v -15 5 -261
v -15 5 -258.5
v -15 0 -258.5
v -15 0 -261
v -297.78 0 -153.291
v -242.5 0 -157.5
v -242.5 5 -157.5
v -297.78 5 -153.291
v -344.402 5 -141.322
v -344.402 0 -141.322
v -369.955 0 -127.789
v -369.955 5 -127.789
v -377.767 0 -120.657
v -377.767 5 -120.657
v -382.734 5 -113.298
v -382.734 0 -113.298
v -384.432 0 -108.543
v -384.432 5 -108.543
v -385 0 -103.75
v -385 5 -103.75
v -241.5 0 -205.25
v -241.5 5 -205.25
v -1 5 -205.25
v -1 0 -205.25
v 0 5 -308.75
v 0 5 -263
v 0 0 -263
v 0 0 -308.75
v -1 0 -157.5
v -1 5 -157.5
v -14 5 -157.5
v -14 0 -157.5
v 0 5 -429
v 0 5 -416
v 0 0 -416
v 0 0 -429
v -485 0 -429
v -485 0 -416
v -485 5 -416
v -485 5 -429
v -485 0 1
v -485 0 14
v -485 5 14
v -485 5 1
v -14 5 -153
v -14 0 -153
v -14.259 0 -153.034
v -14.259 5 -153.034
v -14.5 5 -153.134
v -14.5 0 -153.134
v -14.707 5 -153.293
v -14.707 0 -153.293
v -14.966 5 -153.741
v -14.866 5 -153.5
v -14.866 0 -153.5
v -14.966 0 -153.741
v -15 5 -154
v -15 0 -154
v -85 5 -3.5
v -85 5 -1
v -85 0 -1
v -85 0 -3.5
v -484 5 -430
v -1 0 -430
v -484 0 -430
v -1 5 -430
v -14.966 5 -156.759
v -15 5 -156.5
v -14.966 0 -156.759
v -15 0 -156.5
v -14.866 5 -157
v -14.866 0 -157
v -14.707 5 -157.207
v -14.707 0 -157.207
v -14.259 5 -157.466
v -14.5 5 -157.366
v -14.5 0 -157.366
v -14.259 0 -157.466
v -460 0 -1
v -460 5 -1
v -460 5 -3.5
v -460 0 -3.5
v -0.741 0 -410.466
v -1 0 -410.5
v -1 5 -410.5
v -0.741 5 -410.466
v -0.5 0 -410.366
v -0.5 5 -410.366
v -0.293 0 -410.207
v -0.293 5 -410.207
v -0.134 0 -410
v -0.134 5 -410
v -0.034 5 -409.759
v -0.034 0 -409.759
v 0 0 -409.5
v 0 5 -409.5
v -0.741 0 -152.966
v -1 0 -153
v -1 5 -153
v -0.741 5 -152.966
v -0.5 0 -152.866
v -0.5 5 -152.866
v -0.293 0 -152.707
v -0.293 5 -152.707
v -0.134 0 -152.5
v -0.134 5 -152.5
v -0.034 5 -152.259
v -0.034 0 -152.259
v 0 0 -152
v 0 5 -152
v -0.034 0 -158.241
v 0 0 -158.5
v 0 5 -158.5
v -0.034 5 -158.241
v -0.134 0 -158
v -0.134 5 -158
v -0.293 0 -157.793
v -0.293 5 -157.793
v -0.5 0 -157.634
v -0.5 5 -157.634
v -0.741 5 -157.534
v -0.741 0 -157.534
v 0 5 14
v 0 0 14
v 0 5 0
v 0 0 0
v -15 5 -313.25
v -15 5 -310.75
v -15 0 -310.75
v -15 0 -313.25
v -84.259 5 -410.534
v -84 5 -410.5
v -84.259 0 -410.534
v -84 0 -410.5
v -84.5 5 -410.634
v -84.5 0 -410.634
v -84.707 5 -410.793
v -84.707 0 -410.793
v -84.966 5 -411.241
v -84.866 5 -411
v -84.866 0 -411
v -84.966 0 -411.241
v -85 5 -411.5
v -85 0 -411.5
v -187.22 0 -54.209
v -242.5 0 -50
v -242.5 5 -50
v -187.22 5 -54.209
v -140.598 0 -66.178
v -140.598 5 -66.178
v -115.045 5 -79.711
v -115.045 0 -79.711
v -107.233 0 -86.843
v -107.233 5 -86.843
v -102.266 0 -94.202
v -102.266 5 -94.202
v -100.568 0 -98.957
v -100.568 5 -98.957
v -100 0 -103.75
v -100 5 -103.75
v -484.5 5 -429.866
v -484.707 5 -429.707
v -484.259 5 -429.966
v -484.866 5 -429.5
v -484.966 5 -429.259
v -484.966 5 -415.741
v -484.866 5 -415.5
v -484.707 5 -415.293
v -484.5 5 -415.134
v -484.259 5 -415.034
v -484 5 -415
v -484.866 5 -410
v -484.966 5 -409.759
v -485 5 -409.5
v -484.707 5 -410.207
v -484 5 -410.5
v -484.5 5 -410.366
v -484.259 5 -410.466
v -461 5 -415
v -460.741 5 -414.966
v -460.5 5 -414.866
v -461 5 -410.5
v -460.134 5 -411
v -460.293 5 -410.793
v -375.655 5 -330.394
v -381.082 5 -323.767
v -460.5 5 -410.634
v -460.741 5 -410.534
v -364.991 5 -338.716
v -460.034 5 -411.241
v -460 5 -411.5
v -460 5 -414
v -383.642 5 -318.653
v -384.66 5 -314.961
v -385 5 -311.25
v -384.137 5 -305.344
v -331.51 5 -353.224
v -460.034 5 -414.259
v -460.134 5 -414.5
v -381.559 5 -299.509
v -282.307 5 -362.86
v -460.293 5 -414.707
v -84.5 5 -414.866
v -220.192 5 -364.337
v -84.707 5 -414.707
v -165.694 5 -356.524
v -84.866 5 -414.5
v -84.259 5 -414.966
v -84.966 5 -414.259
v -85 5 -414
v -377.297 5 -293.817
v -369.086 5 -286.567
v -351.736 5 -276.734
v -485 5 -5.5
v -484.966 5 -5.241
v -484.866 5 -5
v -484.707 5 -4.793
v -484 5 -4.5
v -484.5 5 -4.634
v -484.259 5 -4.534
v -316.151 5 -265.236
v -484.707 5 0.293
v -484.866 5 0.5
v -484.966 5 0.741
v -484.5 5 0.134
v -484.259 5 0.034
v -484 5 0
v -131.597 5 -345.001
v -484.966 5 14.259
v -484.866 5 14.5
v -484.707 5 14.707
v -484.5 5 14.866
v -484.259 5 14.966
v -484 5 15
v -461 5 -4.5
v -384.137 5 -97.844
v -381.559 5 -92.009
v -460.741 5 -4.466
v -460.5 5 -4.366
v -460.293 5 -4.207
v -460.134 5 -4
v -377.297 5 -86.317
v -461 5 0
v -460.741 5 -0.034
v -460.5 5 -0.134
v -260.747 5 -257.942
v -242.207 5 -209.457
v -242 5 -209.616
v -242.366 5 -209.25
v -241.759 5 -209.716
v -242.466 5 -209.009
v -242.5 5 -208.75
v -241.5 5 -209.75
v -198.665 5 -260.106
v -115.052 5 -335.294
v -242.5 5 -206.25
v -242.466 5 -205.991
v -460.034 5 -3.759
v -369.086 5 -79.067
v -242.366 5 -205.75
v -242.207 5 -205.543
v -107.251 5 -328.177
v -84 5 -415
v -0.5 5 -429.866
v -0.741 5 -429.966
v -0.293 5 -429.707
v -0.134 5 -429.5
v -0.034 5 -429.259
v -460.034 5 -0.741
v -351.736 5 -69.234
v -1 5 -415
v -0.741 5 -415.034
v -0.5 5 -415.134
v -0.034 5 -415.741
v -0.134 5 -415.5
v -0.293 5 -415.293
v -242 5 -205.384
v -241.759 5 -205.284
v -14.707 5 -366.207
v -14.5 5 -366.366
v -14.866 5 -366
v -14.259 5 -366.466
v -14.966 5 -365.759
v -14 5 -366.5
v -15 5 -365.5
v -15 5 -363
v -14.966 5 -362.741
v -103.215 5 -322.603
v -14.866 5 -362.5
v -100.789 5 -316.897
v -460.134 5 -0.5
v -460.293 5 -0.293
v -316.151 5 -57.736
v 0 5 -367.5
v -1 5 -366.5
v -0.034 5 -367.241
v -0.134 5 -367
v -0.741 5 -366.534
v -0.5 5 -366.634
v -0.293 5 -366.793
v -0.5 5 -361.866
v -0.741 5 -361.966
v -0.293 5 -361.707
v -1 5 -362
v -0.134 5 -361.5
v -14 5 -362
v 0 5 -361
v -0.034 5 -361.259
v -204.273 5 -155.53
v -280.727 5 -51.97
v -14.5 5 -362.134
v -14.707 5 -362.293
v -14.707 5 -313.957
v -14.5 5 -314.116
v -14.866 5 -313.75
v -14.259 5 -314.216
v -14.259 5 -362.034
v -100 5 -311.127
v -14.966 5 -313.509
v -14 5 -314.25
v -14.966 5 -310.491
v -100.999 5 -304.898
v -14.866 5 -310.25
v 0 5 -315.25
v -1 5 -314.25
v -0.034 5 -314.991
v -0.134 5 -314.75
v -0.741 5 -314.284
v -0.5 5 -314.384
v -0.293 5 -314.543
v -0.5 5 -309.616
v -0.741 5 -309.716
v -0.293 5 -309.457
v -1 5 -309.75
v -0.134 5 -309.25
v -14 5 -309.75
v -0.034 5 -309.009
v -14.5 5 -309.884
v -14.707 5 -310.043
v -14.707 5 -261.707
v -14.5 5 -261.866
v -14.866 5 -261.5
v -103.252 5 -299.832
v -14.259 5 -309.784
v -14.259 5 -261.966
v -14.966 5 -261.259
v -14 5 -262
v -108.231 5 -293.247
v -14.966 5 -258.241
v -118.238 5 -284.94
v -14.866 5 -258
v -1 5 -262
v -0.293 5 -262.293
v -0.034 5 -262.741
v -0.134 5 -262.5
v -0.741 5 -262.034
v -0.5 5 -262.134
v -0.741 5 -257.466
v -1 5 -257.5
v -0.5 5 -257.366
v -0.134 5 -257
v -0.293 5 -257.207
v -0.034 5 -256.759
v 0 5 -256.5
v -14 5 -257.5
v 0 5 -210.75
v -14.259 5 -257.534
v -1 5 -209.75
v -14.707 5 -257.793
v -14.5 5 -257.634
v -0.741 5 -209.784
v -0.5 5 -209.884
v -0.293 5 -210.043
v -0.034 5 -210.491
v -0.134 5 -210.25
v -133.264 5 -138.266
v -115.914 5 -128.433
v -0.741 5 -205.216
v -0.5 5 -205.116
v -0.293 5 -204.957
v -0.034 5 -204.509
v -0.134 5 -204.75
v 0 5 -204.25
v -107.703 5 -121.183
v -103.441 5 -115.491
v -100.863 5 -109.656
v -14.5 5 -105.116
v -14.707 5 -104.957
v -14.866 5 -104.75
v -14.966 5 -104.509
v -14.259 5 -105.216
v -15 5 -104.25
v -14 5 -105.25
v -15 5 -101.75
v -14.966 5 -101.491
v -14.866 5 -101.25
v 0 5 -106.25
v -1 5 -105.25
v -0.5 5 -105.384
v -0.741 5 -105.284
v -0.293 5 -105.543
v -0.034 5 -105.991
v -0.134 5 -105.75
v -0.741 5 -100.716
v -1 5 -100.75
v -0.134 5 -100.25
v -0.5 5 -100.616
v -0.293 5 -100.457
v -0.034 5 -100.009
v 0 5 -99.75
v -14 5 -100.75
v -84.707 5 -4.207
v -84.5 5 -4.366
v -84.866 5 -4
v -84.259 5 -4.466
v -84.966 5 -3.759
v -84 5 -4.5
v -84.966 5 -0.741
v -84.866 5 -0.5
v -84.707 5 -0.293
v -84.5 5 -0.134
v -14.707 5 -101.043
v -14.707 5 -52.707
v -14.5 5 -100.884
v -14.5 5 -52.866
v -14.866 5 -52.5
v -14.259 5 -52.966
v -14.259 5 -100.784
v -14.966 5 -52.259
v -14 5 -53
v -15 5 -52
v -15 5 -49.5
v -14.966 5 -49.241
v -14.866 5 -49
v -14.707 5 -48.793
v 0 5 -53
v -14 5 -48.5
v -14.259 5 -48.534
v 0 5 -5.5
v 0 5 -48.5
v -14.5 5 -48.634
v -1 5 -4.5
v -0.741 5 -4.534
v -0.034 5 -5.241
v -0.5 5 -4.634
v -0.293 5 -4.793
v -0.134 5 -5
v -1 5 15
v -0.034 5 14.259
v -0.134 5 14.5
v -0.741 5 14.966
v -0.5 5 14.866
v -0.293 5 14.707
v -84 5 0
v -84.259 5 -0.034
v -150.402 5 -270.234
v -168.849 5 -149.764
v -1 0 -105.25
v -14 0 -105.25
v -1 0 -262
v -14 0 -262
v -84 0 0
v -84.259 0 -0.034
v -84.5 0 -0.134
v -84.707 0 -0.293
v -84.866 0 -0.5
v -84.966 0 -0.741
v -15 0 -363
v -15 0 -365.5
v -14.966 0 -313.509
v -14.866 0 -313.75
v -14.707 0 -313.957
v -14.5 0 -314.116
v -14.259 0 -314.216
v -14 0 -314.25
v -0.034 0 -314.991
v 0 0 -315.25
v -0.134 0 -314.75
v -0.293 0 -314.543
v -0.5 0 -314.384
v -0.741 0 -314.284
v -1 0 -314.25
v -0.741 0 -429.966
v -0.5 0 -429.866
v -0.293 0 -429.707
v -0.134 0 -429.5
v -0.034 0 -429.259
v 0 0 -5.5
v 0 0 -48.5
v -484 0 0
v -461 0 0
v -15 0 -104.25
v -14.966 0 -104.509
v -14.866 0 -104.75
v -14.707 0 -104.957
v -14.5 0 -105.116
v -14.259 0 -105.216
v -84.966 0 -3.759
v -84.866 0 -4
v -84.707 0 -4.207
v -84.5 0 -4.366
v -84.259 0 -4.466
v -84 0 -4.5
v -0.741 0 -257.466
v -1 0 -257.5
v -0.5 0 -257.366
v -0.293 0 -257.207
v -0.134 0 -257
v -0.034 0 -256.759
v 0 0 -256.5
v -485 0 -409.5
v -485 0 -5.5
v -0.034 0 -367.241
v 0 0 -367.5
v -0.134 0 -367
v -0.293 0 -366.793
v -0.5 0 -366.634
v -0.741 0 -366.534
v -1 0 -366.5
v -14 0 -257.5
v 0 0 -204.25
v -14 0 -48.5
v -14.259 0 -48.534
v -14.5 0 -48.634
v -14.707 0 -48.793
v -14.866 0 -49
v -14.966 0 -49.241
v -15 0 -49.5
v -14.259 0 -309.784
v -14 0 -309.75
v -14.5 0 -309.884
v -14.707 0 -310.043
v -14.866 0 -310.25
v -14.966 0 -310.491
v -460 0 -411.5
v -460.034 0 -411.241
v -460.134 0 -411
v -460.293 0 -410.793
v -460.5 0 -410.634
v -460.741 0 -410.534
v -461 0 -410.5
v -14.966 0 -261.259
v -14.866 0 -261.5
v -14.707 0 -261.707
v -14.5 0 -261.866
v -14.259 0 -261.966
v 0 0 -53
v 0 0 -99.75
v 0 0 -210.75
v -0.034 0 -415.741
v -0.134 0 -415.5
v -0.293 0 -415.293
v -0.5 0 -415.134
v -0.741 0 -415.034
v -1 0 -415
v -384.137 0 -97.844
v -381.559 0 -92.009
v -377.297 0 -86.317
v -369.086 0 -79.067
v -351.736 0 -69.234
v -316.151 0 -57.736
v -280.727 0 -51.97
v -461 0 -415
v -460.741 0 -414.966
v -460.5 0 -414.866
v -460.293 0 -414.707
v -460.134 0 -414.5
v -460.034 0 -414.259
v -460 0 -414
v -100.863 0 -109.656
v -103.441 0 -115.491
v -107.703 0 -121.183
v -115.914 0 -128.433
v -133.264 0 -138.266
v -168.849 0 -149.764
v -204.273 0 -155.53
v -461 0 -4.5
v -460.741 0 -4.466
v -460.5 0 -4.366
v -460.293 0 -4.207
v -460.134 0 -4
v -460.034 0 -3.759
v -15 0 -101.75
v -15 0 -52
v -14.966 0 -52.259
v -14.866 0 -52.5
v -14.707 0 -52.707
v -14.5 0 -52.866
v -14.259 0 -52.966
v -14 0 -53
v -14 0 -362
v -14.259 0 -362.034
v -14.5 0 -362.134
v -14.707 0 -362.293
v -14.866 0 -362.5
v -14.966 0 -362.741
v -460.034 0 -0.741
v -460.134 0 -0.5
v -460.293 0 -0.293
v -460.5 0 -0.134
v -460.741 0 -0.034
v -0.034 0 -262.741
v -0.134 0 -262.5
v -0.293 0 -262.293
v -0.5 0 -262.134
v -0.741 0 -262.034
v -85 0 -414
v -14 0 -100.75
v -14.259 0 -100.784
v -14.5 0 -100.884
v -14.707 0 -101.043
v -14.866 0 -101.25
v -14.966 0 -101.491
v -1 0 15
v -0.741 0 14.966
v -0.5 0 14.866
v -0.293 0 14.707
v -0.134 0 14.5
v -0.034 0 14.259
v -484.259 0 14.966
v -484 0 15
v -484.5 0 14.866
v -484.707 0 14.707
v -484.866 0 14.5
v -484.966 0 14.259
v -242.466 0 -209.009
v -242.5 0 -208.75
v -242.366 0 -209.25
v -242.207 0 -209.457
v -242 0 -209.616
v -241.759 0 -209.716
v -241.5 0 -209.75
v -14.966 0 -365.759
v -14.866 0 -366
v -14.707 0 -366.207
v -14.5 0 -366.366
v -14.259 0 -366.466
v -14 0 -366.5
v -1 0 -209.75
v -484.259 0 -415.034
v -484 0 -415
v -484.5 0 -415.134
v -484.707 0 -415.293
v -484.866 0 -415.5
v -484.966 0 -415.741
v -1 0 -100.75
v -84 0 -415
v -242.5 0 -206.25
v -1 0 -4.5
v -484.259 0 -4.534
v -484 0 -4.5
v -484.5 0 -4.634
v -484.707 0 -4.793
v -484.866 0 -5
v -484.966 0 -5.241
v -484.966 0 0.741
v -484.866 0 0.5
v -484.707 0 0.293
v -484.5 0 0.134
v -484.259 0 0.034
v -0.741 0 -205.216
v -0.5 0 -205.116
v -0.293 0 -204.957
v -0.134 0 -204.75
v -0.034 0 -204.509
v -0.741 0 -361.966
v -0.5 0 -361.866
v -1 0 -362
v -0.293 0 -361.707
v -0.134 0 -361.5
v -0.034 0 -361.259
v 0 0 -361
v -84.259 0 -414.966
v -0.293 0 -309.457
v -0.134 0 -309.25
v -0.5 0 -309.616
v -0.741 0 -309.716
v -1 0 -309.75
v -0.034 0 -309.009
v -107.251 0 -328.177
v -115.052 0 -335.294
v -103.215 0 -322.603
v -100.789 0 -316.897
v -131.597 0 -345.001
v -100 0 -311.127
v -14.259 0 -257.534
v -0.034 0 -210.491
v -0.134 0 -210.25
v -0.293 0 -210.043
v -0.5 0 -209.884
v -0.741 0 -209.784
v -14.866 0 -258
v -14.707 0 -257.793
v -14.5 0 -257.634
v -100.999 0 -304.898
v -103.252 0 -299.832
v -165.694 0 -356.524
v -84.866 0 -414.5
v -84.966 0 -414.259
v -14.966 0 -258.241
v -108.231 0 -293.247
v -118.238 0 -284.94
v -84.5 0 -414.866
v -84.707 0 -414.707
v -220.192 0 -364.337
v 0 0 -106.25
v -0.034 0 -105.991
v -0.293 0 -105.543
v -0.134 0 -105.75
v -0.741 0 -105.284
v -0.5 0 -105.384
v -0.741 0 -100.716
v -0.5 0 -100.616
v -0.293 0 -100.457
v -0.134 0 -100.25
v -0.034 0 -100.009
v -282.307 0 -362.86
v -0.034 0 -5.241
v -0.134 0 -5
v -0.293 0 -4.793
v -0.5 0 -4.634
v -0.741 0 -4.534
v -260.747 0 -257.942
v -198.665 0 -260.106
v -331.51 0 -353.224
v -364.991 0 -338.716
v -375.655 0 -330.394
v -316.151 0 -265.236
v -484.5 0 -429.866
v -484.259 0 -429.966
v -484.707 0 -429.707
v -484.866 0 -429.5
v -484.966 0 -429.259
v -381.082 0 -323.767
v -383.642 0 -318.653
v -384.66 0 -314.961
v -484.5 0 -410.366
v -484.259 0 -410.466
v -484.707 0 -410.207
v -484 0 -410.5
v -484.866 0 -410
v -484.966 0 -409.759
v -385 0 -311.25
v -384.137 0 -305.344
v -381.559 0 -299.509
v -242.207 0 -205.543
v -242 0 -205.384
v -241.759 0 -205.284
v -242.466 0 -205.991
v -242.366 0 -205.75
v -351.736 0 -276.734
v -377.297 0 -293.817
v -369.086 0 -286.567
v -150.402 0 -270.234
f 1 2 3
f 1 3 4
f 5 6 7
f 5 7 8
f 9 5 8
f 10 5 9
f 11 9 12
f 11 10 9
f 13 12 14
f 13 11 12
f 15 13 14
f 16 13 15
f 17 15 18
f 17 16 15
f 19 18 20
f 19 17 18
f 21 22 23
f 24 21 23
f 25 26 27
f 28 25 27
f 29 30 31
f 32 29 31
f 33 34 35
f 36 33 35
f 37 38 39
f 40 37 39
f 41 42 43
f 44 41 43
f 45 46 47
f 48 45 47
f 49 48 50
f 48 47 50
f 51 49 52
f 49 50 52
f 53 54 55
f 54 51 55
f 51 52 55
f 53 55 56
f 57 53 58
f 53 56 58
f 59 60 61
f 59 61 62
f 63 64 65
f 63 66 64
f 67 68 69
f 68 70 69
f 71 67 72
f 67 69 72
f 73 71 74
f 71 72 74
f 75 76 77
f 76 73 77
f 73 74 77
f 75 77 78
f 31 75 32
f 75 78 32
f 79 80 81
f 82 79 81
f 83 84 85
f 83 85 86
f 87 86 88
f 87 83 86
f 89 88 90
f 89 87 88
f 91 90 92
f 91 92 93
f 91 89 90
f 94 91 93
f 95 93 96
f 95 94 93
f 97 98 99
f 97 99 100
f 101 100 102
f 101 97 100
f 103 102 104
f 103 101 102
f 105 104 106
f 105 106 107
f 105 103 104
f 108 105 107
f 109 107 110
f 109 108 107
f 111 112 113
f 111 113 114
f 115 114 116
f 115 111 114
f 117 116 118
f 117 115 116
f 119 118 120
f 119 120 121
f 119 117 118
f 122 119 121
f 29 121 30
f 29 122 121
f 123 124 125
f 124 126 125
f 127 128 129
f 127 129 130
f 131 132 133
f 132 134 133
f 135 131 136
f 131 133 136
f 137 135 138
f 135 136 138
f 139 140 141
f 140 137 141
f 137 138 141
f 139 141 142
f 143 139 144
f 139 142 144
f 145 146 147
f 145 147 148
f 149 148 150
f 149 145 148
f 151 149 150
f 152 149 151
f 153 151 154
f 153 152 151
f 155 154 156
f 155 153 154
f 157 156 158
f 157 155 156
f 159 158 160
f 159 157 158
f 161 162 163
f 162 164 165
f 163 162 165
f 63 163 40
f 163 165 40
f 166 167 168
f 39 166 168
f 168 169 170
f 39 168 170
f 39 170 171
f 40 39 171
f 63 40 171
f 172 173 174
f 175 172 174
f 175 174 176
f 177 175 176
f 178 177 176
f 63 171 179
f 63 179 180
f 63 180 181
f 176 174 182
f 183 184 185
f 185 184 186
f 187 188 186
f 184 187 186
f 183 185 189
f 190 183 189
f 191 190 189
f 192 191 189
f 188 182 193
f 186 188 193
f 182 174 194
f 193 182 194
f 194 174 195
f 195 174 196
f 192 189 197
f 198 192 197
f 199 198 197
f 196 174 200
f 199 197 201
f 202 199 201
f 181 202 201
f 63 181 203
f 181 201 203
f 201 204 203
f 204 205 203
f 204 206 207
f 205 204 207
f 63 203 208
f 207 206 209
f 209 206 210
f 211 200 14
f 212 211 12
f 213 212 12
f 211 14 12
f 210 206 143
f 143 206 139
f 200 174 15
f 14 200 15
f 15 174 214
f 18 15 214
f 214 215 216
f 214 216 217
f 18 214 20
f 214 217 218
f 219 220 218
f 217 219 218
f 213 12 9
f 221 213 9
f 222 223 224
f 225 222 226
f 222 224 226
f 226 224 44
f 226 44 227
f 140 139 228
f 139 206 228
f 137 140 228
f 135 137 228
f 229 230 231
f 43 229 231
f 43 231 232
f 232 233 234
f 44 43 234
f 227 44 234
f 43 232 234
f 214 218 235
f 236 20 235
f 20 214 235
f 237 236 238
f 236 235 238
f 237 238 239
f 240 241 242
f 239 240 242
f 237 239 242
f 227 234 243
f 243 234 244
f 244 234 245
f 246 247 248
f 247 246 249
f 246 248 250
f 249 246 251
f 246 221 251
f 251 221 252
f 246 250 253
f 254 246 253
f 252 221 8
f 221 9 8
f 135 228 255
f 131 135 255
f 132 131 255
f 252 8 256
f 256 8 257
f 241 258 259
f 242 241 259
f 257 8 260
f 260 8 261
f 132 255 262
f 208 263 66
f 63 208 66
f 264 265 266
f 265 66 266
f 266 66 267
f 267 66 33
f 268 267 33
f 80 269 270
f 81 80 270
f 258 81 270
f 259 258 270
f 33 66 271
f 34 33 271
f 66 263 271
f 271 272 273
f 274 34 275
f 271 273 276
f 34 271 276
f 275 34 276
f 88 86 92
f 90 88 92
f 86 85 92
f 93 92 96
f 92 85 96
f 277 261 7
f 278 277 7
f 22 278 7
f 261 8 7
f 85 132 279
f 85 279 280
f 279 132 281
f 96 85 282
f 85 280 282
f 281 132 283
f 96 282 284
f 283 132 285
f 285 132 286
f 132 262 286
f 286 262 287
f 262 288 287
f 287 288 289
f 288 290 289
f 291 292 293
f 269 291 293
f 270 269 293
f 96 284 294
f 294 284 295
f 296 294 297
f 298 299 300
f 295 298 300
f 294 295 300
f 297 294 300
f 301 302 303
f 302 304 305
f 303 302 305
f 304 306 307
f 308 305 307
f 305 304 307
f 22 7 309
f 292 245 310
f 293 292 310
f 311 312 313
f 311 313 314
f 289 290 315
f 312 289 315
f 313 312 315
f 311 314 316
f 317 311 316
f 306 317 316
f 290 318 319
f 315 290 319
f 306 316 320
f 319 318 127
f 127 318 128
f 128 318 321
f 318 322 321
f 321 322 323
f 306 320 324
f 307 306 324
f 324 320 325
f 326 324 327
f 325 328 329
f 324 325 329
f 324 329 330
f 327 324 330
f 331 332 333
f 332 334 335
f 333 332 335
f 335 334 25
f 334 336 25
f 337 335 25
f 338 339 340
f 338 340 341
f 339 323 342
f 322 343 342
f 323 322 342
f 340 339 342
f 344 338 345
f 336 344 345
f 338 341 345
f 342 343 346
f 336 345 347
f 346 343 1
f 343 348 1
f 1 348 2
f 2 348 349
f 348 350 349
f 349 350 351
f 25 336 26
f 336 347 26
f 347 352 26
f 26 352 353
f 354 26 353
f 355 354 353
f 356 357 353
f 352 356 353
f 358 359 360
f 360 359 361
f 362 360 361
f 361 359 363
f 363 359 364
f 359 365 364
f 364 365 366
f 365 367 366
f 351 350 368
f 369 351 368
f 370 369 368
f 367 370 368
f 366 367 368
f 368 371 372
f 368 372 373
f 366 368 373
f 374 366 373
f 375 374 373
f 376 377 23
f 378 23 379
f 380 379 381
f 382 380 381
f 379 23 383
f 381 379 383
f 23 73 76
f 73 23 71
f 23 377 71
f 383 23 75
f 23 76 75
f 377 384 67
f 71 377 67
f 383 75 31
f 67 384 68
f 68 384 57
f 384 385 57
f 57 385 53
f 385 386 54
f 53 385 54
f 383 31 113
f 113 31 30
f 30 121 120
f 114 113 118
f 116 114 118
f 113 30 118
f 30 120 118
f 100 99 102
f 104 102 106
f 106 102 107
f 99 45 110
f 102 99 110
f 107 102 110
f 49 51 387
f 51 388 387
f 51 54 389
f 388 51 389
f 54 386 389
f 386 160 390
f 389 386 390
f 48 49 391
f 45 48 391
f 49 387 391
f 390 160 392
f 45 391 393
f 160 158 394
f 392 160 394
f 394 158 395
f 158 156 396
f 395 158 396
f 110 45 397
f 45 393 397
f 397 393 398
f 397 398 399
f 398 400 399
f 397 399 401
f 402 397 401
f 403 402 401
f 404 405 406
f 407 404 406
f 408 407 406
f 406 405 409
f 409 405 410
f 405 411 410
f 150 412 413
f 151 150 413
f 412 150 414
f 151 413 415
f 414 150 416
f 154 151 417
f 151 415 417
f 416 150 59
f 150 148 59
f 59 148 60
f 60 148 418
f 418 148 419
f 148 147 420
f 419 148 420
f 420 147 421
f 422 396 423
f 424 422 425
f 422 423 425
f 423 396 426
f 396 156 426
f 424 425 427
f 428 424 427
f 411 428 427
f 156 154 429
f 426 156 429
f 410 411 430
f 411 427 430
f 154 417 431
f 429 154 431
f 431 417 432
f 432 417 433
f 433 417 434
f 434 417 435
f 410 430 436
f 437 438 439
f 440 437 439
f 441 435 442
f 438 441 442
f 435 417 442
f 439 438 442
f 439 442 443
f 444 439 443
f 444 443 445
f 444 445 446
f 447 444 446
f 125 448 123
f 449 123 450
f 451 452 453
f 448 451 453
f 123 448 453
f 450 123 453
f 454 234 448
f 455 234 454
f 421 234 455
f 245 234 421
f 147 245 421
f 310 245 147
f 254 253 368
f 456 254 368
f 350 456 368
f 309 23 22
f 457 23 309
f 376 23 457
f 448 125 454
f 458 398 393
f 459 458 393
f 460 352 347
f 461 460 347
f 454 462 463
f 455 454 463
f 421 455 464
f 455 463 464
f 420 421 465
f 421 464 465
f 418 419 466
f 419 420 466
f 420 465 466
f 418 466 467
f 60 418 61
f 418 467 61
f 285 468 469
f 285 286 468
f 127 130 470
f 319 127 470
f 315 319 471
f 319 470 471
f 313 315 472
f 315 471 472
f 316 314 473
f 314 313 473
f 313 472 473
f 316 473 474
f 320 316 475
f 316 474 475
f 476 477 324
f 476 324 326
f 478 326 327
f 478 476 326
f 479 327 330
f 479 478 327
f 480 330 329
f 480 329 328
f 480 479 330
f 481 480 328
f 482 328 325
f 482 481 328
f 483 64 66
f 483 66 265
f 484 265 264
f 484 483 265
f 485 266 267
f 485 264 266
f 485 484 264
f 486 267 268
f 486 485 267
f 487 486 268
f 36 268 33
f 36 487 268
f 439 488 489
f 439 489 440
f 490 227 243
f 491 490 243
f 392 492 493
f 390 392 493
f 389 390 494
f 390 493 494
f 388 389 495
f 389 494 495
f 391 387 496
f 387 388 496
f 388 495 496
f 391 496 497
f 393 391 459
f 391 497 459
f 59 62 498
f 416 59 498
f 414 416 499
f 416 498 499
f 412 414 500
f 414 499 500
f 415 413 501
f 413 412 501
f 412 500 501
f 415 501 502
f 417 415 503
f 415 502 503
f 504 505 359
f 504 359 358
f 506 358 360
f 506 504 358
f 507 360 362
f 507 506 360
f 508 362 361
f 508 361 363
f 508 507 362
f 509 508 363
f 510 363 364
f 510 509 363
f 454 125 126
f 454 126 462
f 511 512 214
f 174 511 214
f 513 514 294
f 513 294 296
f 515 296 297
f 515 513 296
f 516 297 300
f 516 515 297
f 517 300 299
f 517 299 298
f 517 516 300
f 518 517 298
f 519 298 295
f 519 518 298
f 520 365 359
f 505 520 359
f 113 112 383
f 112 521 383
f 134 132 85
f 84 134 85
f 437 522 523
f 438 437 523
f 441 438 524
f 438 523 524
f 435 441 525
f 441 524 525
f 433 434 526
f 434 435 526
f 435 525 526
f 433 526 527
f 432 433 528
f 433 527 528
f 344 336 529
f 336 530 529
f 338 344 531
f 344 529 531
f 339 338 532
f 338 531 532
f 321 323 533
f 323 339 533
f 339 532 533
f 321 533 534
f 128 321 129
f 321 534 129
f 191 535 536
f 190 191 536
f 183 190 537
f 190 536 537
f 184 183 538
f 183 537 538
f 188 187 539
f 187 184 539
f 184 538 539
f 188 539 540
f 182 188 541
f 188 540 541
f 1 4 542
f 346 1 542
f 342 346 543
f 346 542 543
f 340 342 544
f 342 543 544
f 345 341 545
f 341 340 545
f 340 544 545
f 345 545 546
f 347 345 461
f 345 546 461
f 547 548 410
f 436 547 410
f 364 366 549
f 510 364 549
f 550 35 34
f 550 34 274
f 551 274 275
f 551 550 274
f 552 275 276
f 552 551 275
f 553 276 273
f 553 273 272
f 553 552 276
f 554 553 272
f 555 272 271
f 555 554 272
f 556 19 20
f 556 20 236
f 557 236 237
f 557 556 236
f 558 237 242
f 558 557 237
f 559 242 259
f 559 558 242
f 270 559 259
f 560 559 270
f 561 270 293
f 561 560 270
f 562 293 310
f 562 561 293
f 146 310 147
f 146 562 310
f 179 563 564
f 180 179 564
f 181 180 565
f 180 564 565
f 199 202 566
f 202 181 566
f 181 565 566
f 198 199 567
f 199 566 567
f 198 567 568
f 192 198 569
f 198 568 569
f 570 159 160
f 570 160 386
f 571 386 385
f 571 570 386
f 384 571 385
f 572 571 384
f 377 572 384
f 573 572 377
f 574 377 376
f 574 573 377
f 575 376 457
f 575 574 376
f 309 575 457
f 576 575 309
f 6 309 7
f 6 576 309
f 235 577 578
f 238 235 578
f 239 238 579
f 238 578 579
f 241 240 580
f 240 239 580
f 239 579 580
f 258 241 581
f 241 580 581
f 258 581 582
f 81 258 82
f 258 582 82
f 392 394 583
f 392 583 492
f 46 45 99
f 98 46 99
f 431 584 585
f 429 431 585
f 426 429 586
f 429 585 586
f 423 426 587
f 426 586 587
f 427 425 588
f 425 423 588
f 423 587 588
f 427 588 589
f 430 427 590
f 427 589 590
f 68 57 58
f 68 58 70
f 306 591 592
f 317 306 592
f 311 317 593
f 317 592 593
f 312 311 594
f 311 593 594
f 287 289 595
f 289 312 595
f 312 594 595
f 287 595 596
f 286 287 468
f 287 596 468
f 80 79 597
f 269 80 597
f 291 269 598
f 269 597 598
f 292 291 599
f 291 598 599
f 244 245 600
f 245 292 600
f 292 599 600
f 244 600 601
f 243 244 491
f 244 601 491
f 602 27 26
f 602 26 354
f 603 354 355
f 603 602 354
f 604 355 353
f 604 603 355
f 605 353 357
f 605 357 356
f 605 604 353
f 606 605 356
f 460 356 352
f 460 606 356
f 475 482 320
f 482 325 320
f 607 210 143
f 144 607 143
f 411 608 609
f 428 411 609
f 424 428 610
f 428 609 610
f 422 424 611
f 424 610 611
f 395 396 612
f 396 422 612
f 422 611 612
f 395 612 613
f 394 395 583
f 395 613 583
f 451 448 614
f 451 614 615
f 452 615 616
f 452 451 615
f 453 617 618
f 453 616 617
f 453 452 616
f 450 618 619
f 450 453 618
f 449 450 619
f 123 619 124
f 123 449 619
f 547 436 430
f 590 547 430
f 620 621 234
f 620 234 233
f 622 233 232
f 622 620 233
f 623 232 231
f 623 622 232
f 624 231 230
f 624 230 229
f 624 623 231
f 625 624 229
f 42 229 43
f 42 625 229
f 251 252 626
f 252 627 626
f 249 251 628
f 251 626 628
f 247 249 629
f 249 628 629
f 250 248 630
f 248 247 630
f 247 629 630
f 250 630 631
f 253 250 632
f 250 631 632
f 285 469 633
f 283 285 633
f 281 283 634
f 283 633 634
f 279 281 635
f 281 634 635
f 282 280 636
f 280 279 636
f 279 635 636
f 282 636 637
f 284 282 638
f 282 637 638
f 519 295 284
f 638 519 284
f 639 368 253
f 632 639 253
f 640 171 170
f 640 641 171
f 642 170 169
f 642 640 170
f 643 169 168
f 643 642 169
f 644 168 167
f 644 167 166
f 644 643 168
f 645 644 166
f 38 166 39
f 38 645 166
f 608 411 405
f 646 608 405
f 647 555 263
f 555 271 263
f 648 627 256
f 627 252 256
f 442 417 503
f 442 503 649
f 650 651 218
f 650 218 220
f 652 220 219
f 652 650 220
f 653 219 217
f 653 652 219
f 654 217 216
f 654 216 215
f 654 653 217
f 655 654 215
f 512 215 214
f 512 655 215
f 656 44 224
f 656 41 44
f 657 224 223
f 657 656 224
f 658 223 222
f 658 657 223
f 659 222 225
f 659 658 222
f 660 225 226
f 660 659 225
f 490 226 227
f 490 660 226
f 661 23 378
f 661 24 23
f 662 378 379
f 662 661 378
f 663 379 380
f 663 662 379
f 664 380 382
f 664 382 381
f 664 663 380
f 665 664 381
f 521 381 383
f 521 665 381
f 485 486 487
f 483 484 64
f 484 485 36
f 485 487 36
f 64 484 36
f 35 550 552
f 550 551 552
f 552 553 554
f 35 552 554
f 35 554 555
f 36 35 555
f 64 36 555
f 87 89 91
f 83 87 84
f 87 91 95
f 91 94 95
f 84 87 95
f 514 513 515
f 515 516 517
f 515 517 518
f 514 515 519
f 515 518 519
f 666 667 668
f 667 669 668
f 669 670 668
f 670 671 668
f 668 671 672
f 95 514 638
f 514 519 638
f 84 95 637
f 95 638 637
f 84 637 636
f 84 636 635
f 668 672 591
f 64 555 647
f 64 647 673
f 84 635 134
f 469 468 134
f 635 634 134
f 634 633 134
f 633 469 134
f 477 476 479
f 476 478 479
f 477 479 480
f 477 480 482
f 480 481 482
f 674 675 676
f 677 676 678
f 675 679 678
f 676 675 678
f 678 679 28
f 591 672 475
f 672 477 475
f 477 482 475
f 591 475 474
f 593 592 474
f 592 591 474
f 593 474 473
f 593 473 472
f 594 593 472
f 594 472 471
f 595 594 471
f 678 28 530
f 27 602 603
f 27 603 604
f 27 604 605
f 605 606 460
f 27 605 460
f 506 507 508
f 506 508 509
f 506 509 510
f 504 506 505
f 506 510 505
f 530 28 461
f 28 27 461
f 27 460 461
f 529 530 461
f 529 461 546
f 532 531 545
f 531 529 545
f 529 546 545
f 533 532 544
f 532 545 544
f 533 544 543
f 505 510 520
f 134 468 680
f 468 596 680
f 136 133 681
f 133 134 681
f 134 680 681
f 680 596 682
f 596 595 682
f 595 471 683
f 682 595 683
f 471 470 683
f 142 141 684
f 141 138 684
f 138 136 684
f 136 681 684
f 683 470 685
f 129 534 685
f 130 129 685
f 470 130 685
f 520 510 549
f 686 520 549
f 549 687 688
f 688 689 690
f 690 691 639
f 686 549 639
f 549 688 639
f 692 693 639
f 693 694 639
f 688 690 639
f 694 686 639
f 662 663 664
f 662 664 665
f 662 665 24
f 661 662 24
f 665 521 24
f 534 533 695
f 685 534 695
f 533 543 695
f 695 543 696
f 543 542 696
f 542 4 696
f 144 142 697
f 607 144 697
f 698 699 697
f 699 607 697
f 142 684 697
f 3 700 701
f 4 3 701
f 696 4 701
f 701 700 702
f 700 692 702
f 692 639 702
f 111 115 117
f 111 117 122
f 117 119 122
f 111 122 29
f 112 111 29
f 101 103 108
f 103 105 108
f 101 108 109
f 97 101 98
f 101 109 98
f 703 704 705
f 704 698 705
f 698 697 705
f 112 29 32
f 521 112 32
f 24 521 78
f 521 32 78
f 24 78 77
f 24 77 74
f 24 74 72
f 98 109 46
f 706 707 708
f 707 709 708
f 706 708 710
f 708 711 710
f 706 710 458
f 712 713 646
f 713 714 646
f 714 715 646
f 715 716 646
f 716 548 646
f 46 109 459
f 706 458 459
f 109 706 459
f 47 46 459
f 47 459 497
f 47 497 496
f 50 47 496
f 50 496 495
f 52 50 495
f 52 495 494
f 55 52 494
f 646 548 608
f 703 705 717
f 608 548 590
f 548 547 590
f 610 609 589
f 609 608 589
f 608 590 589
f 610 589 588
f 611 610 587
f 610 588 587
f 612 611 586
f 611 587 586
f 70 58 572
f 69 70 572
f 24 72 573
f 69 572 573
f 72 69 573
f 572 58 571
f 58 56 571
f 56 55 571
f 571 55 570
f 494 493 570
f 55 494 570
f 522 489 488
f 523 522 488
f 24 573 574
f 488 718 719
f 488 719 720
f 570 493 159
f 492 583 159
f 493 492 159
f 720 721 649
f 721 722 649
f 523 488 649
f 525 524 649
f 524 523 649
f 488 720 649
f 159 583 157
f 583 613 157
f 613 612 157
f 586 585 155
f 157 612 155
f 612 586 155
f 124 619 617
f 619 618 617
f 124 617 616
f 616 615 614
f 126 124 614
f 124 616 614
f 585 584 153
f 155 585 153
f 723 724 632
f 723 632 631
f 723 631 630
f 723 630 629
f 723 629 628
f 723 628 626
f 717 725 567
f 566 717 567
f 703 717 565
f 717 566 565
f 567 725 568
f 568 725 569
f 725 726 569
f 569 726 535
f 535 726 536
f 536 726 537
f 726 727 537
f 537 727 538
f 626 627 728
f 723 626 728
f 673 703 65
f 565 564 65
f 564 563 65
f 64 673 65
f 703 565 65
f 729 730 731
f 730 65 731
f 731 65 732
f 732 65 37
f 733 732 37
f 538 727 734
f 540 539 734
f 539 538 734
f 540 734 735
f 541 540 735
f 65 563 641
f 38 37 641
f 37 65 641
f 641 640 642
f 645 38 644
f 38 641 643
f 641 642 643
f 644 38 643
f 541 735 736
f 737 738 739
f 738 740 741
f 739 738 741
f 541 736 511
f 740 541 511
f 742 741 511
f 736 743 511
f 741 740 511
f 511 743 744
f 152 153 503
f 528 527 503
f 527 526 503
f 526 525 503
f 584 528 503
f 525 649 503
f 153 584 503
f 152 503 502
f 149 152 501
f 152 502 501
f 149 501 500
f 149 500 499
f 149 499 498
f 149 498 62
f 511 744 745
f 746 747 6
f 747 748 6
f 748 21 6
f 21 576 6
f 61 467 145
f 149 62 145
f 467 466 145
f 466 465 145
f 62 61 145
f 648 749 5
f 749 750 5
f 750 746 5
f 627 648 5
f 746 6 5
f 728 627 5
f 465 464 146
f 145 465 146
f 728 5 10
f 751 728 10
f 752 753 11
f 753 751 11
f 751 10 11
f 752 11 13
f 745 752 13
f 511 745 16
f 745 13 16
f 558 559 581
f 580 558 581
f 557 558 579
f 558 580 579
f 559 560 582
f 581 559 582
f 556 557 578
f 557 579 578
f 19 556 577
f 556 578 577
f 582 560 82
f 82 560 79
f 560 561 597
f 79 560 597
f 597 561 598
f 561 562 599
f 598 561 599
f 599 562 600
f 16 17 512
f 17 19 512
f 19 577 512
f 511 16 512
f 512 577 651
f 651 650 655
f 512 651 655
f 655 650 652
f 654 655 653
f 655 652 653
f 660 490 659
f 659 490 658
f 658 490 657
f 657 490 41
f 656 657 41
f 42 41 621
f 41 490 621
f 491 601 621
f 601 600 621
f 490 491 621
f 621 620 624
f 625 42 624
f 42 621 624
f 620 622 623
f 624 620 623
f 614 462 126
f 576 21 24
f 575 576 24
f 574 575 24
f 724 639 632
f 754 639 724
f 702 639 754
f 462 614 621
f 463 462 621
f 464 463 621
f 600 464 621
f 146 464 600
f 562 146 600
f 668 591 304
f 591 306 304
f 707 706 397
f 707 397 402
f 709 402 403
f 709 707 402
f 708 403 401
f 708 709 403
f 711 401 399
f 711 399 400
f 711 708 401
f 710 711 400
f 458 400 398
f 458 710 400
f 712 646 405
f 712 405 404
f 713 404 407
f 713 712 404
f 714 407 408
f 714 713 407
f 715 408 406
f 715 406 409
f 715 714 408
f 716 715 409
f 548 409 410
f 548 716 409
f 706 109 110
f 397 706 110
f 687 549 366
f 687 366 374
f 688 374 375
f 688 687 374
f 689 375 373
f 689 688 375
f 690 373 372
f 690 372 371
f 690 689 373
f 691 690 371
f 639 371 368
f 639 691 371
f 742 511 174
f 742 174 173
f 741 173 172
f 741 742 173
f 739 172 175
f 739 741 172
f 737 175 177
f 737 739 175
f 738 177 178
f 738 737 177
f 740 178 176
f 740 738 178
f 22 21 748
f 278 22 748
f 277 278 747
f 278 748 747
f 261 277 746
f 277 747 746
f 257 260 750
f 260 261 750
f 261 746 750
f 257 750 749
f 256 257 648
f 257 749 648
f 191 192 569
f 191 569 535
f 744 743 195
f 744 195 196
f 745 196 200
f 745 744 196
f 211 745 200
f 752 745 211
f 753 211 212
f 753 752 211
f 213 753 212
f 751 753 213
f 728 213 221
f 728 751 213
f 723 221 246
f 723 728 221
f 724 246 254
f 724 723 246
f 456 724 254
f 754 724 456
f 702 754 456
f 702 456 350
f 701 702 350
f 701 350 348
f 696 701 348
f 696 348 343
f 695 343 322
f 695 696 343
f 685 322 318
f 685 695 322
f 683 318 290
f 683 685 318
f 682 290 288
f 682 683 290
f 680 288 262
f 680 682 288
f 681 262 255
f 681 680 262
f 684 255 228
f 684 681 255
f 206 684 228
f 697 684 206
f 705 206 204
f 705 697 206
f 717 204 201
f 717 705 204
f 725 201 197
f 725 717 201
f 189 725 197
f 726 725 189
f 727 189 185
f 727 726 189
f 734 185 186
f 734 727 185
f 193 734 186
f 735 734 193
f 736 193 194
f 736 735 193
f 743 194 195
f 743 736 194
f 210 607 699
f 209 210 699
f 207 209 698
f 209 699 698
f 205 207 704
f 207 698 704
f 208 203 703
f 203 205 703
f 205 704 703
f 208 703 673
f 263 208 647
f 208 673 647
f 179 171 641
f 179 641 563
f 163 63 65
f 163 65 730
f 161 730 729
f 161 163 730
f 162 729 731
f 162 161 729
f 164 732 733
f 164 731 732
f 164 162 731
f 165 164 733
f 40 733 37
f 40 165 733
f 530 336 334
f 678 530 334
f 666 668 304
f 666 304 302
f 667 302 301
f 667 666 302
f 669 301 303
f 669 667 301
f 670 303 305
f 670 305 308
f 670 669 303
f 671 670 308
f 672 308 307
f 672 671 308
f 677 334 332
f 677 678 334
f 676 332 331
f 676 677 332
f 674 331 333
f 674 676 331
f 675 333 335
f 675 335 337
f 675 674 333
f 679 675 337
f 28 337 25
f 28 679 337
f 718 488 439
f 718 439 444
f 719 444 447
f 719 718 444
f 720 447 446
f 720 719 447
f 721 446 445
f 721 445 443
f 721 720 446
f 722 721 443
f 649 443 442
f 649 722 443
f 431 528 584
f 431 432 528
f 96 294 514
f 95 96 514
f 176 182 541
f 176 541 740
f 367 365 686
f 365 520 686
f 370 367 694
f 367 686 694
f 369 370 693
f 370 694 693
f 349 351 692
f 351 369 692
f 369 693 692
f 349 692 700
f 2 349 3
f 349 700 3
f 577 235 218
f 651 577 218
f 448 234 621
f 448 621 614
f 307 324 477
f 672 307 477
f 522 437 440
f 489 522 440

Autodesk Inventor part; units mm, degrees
ref_plane "YZ Plane" through (0, 0, 0) normal (1, 0, 0) x (0, 1, 0)
ref_plane "XZ Plane" through (0, 0, 0) normal (0, 1, 0) x (-1, 0, 0)
ref_plane "XY Plane" through (0, 0, 0) normal (0, 0, 1) x (1, 0, 0)
sketch "Sketch1" plane through (0, 0, 0) normal (0, 1, 0) x (-1, 0, 0)
  line L0 (0, 0) -> (485, 0)
  line L1 (485, 0) -> (485, -415)
  line L2 (485, -415) -> (0, -415)
  line L3 (0, -415) -> (0, 0)
  line L4 (485, -207.5) -> (0, -207.5)
  line L5 (0, -207.5) -> (0, 0)
  line L6 (0, -103.75) -> (100, -103.75)
  line L7 (485, -103.75) -> (385, -103.75)
  line L8 (242.5, 0) -> (242.5, -103.75)
  line L9 (242.5, -207.5) -> (242.5, -157.5)
  ellipse E0 centre (242.5, -103.75) end of major axis (385, -103.75) minor radius 53.75
  ellipse E1 centre (242.5, -311.25) end of major axis (385, -311.25) minor radius 53.75
  dimension "d0" = 485
  dimension "d1" = 415
  dimension "d2" = 100
  dimension "d3" = 100
  dimension "d4" = 103.75
  dimension "d5" = 50
  dimension "d6" = 103.75
  dimension "d7" = 103.75
extrude "Extrusion1" add sketch "Sketch1" along normal blind 5 contours L0 L8 E0 L6 L3 | L0 L1 L7 E0 L8 | L6 E0 L9 L4 L3 | L4 L1 L2 L3 | L1 L4 L9 E0 L7
sketch "Sketch2" plane through (0, 5, 0) normal (0, 1, 0) x (1, 0, 0)
  line L0 (0, 0) -> (0, 415) projected
  line L1 (0, 207.5) -> (0, 209.75)
  line L2 (0, 209.75) -> (0, 207.5)
  line L3 (-485, 0) -> (0, 0) projected
  line L4 (-242.5, 0) -> (-242.5, 207.5)
  line L5 (0, 209.75) -> (-242.5, 209.75)
  line L6 (-242.5, 209.75) -> (-242.5, 205.25)
  line L7 (-242.5, 205.25) -> (0, 205.25)
  line L8 (0, 205.25) -> (0, 209.75)
  point P0 (0, 205.25)
  dimension "d10" = 2.25
  dimension "d11" = 4.5
extrude "Extrusion2" cut sketch "Sketch2" against normal blind 5 contours L7 L4 L6 L5 L0
sketch "Sketch3" plane through (-485, 0, 0) normal (0, 0, 1) x (1, 0, 0)
  line L0 (485, 0) -> (0, 0) projected
  line L1 (485, 0) -> (485, 5) projected
  line L2 (0, 0) -> (485, 0)
  line L3 (485, 0) -> (485, 5)
  line L4 (485, 5) -> (0, 5)
  line L5 (0, 5) -> (0, 0)
extrude "Extrusion3" add sketch "Sketch3" along normal blind 15
sketch "Sketch4" plane through (0, 0, -415) normal (0, 0, -1) x (-1, 0, 0)
  line L0 (485, 0) -> (485, 5) projected
  line L1 (485, 5) -> (0, 5)
  line L2 (0, 5) -> (0, 0)
  line L3 (0, 0) -> (485, 0)
  line L4 (485, 0) -> (485, 5)
extrude "Extrusion4" add sketch "Sketch4" along normal blind 15
sketch "Sketch5" plane through (0, 5, 0) normal (0, 1, 0) x (1, 0, 0)
  line L0 (-485, -15) -> (-485, 430) projected
  line L1 (-485, 207.5) -> (54.8472, 207.5)
  line L2 (-485, 0) -> (-460, 0)
  line L3 (-460, 0) -> (-460, 4.5)
  line L4 (-460, 4.5) -> (-485, 4.5)
  line L5 (-485, 4.5) -> (-485, 0)
  line L6 (0, 0) -> (-85, 0)
  line L7 (-85, 0) -> (-85, 4.5)
  line L8 (-85, 4.5) -> (0, 4.5)
  line L9 (0, 4.5) -> (0, 0)
  line L10 (0, -15) -> (-485, -15) projected
  line L11 (-485, 415) -> (-460, 415)
  line L12 (-460, 415) -> (-460, 410.5)
  line L13 (-460, 410.5) -> (-485, 410.5)
  line L14 (-485, 410.5) -> (-485, 415)
  line L15 (0, 415) -> (-85, 415)
  line L16 (-85, 415) -> (-85, 410.5)
  line L17 (-85, 410.5) -> (0, 410.5)
  line L18 (0, 410.5) -> (0, 415)
  line L19 (0, 205.25) -> (-242.5, 205.25) projected
  line L20 (-242.5, 205.25) -> (-242.5, 207.5)
  line L21 (-242.5, 205.25) -> (-242.5, 209.75) projected
  dimension "d18" = 25
  dimension "d19" = 4.5
  dimension "d20" = 85
  dimension "d21" = 4.5
  dimension "d22" = 15
extrude "Extrusion5" cut sketch "Sketch5" against normal blind 5
sketch "Sketch6" plane through (0, 5, 0) normal (0, 1, 0) x (1, 0, 0)
  line L0 (-15, 4.5) -> (-15, 584.4984)
  line L1 (-15, 4.5) -> (-15, 48.5)
  line L2 (-15, 48.5) -> (0, 48.5)
  line L3 (0, 48.5) -> (0, 53)
  line L4 (0, 53) -> (-15, 53)
  line L5 (-15, 53) -> (-15, 48.5)
  line L6 (-15, 100.75) -> (0, 100.75)
  line L7 (0, 100.75) -> (0, 105.25)
  line L8 (0, 105.25) -> (-15, 105.25)
  line L9 (-15, 105.25) -> (-15, 100.75)
  line L10 (-15, 153) -> (0, 153)
  line L11 (0, 153) -> (0, 157.5)
  line L12 (0, 157.5) -> (-15, 157.5)
  line L13 (-15, 157.5) -> (-15, 153)
  line L14 (-15, 205.25) -> (0, 205.25)
  line L15 (0, 205.25) -> (0, 209.75)
  line L16 (0, 209.75) -> (-15, 209.75)
  line L17 (-15, 209.75) -> (-15, 205.25)
  line L18 (-15, 257.5) -> (0, 257.5)
  line L19 (0, 257.5) -> (0, 262)
  line L20 (0, 262) -> (-15, 262)
  line L21 (-15, 262) -> (-15, 257.5)
  line L22 (-15, 309.75) -> (0, 309.75)
  line L23 (0, 309.75) -> (0, 314.25)
  line L24 (0, 314.25) -> (-15, 314.25)
  line L25 (-15, 314.25) -> (-15, 309.75)
  line L26 (-15, 362) -> (0, 362)
  line L27 (0, 362) -> (0, 366.5)
  line L28 (0, 366.5) -> (-15, 366.5)
  line L29 (-15, 366.5) -> (-15, 362)
  line L30 (0, 205.25) -> (0, 4.5) projected
  line L31 (0, 4.5) -> (-15, 4.5)
  line L32 (0, 4.5) -> (-85, 4.5) projected
  line L33 (0, 209.75) -> (0, 410.5) projected
  point P0 (0, 0)
  point P1 (-15, 53)
  point P2 (-15, 100.75)
  point P3 (-15, 105.25)
  point P4 (-15, 262)
  point P5 (-15, 257.5)
  point P6 (-15, 314.25)
  point P7 (-15, 309.75)
  point P8 (-15, 366.5)
  point P9 (-15, 362)
  dimension "d29" = 44
  dimension "d30" = 15
  dimension "d31" = 4.5
  dimension "d32" = 52.25
  dimension "d34" = 15
  dimension "d35" = 0
extrude "Extrusion6" cut sketch "Sketch6" against normal blind 5 contours L0 L4 L3 L2 | L0 L8 L7 L6 | L0 L12 L11 L10 | L0 L20 L19 L18 | L0 L24 L23 L22 | L0 L28 L27 L26
fillet "Fillet1" radius 1 45 edges at (-460, 2.5, 0) (-460, 2.5, -4.5) (-485, 2.5, -4.5) (-485, 2.5, 0) (-485, 2.5, 15) (0, 2.5, 15) (-85, 2.5, -4.5) (-85, 2.5, 0) (0, 2.5, -4.5) (-15, 2.5, -53) (-15, 2.5, -48.5) (-15, 2.5, -105.25) (-15, 2.5, -100.75) (0, 2.5, -100.75) (0, 2.5, -105.25) (-15, 2.5, -157.5) (-15, 2.5, -153) (0, 2.5, -153) (0, 2.5, -157.5) (0, 2.5, -205.25) (0, 2.5, -209.75) (-242.5, 2.5, -209.75) (-242.5, 2.5, -205.25) (0, 2.5, -257.5) (0, 2.5, -262) (-15, 2.5, -262) (-15, 2.5, -257.5) (0, 2.5, -309.75) (0, 2.5, -314.25) (-15, 2.5, -314.25) (-15, 2.5, -309.75) (-15, 2.5, -366.5) (-15, 2.5, -362) (0, 2.5, -362) (0, 2.5, -366.5) (0, 2.5, -415) (0, 2.5, -410.5) (0, 2.5, -430) (-85, 2.5, -415) (-85, 2.5, -410.5) (-460, 2.5, -410.5) (-460, 2.5, -415) (-485, 2.5, -430) (-485, 2.5, -415) (-485, 2.5, -410.5)
properties part number "inside_leg_2" material "Foam Core Board"
